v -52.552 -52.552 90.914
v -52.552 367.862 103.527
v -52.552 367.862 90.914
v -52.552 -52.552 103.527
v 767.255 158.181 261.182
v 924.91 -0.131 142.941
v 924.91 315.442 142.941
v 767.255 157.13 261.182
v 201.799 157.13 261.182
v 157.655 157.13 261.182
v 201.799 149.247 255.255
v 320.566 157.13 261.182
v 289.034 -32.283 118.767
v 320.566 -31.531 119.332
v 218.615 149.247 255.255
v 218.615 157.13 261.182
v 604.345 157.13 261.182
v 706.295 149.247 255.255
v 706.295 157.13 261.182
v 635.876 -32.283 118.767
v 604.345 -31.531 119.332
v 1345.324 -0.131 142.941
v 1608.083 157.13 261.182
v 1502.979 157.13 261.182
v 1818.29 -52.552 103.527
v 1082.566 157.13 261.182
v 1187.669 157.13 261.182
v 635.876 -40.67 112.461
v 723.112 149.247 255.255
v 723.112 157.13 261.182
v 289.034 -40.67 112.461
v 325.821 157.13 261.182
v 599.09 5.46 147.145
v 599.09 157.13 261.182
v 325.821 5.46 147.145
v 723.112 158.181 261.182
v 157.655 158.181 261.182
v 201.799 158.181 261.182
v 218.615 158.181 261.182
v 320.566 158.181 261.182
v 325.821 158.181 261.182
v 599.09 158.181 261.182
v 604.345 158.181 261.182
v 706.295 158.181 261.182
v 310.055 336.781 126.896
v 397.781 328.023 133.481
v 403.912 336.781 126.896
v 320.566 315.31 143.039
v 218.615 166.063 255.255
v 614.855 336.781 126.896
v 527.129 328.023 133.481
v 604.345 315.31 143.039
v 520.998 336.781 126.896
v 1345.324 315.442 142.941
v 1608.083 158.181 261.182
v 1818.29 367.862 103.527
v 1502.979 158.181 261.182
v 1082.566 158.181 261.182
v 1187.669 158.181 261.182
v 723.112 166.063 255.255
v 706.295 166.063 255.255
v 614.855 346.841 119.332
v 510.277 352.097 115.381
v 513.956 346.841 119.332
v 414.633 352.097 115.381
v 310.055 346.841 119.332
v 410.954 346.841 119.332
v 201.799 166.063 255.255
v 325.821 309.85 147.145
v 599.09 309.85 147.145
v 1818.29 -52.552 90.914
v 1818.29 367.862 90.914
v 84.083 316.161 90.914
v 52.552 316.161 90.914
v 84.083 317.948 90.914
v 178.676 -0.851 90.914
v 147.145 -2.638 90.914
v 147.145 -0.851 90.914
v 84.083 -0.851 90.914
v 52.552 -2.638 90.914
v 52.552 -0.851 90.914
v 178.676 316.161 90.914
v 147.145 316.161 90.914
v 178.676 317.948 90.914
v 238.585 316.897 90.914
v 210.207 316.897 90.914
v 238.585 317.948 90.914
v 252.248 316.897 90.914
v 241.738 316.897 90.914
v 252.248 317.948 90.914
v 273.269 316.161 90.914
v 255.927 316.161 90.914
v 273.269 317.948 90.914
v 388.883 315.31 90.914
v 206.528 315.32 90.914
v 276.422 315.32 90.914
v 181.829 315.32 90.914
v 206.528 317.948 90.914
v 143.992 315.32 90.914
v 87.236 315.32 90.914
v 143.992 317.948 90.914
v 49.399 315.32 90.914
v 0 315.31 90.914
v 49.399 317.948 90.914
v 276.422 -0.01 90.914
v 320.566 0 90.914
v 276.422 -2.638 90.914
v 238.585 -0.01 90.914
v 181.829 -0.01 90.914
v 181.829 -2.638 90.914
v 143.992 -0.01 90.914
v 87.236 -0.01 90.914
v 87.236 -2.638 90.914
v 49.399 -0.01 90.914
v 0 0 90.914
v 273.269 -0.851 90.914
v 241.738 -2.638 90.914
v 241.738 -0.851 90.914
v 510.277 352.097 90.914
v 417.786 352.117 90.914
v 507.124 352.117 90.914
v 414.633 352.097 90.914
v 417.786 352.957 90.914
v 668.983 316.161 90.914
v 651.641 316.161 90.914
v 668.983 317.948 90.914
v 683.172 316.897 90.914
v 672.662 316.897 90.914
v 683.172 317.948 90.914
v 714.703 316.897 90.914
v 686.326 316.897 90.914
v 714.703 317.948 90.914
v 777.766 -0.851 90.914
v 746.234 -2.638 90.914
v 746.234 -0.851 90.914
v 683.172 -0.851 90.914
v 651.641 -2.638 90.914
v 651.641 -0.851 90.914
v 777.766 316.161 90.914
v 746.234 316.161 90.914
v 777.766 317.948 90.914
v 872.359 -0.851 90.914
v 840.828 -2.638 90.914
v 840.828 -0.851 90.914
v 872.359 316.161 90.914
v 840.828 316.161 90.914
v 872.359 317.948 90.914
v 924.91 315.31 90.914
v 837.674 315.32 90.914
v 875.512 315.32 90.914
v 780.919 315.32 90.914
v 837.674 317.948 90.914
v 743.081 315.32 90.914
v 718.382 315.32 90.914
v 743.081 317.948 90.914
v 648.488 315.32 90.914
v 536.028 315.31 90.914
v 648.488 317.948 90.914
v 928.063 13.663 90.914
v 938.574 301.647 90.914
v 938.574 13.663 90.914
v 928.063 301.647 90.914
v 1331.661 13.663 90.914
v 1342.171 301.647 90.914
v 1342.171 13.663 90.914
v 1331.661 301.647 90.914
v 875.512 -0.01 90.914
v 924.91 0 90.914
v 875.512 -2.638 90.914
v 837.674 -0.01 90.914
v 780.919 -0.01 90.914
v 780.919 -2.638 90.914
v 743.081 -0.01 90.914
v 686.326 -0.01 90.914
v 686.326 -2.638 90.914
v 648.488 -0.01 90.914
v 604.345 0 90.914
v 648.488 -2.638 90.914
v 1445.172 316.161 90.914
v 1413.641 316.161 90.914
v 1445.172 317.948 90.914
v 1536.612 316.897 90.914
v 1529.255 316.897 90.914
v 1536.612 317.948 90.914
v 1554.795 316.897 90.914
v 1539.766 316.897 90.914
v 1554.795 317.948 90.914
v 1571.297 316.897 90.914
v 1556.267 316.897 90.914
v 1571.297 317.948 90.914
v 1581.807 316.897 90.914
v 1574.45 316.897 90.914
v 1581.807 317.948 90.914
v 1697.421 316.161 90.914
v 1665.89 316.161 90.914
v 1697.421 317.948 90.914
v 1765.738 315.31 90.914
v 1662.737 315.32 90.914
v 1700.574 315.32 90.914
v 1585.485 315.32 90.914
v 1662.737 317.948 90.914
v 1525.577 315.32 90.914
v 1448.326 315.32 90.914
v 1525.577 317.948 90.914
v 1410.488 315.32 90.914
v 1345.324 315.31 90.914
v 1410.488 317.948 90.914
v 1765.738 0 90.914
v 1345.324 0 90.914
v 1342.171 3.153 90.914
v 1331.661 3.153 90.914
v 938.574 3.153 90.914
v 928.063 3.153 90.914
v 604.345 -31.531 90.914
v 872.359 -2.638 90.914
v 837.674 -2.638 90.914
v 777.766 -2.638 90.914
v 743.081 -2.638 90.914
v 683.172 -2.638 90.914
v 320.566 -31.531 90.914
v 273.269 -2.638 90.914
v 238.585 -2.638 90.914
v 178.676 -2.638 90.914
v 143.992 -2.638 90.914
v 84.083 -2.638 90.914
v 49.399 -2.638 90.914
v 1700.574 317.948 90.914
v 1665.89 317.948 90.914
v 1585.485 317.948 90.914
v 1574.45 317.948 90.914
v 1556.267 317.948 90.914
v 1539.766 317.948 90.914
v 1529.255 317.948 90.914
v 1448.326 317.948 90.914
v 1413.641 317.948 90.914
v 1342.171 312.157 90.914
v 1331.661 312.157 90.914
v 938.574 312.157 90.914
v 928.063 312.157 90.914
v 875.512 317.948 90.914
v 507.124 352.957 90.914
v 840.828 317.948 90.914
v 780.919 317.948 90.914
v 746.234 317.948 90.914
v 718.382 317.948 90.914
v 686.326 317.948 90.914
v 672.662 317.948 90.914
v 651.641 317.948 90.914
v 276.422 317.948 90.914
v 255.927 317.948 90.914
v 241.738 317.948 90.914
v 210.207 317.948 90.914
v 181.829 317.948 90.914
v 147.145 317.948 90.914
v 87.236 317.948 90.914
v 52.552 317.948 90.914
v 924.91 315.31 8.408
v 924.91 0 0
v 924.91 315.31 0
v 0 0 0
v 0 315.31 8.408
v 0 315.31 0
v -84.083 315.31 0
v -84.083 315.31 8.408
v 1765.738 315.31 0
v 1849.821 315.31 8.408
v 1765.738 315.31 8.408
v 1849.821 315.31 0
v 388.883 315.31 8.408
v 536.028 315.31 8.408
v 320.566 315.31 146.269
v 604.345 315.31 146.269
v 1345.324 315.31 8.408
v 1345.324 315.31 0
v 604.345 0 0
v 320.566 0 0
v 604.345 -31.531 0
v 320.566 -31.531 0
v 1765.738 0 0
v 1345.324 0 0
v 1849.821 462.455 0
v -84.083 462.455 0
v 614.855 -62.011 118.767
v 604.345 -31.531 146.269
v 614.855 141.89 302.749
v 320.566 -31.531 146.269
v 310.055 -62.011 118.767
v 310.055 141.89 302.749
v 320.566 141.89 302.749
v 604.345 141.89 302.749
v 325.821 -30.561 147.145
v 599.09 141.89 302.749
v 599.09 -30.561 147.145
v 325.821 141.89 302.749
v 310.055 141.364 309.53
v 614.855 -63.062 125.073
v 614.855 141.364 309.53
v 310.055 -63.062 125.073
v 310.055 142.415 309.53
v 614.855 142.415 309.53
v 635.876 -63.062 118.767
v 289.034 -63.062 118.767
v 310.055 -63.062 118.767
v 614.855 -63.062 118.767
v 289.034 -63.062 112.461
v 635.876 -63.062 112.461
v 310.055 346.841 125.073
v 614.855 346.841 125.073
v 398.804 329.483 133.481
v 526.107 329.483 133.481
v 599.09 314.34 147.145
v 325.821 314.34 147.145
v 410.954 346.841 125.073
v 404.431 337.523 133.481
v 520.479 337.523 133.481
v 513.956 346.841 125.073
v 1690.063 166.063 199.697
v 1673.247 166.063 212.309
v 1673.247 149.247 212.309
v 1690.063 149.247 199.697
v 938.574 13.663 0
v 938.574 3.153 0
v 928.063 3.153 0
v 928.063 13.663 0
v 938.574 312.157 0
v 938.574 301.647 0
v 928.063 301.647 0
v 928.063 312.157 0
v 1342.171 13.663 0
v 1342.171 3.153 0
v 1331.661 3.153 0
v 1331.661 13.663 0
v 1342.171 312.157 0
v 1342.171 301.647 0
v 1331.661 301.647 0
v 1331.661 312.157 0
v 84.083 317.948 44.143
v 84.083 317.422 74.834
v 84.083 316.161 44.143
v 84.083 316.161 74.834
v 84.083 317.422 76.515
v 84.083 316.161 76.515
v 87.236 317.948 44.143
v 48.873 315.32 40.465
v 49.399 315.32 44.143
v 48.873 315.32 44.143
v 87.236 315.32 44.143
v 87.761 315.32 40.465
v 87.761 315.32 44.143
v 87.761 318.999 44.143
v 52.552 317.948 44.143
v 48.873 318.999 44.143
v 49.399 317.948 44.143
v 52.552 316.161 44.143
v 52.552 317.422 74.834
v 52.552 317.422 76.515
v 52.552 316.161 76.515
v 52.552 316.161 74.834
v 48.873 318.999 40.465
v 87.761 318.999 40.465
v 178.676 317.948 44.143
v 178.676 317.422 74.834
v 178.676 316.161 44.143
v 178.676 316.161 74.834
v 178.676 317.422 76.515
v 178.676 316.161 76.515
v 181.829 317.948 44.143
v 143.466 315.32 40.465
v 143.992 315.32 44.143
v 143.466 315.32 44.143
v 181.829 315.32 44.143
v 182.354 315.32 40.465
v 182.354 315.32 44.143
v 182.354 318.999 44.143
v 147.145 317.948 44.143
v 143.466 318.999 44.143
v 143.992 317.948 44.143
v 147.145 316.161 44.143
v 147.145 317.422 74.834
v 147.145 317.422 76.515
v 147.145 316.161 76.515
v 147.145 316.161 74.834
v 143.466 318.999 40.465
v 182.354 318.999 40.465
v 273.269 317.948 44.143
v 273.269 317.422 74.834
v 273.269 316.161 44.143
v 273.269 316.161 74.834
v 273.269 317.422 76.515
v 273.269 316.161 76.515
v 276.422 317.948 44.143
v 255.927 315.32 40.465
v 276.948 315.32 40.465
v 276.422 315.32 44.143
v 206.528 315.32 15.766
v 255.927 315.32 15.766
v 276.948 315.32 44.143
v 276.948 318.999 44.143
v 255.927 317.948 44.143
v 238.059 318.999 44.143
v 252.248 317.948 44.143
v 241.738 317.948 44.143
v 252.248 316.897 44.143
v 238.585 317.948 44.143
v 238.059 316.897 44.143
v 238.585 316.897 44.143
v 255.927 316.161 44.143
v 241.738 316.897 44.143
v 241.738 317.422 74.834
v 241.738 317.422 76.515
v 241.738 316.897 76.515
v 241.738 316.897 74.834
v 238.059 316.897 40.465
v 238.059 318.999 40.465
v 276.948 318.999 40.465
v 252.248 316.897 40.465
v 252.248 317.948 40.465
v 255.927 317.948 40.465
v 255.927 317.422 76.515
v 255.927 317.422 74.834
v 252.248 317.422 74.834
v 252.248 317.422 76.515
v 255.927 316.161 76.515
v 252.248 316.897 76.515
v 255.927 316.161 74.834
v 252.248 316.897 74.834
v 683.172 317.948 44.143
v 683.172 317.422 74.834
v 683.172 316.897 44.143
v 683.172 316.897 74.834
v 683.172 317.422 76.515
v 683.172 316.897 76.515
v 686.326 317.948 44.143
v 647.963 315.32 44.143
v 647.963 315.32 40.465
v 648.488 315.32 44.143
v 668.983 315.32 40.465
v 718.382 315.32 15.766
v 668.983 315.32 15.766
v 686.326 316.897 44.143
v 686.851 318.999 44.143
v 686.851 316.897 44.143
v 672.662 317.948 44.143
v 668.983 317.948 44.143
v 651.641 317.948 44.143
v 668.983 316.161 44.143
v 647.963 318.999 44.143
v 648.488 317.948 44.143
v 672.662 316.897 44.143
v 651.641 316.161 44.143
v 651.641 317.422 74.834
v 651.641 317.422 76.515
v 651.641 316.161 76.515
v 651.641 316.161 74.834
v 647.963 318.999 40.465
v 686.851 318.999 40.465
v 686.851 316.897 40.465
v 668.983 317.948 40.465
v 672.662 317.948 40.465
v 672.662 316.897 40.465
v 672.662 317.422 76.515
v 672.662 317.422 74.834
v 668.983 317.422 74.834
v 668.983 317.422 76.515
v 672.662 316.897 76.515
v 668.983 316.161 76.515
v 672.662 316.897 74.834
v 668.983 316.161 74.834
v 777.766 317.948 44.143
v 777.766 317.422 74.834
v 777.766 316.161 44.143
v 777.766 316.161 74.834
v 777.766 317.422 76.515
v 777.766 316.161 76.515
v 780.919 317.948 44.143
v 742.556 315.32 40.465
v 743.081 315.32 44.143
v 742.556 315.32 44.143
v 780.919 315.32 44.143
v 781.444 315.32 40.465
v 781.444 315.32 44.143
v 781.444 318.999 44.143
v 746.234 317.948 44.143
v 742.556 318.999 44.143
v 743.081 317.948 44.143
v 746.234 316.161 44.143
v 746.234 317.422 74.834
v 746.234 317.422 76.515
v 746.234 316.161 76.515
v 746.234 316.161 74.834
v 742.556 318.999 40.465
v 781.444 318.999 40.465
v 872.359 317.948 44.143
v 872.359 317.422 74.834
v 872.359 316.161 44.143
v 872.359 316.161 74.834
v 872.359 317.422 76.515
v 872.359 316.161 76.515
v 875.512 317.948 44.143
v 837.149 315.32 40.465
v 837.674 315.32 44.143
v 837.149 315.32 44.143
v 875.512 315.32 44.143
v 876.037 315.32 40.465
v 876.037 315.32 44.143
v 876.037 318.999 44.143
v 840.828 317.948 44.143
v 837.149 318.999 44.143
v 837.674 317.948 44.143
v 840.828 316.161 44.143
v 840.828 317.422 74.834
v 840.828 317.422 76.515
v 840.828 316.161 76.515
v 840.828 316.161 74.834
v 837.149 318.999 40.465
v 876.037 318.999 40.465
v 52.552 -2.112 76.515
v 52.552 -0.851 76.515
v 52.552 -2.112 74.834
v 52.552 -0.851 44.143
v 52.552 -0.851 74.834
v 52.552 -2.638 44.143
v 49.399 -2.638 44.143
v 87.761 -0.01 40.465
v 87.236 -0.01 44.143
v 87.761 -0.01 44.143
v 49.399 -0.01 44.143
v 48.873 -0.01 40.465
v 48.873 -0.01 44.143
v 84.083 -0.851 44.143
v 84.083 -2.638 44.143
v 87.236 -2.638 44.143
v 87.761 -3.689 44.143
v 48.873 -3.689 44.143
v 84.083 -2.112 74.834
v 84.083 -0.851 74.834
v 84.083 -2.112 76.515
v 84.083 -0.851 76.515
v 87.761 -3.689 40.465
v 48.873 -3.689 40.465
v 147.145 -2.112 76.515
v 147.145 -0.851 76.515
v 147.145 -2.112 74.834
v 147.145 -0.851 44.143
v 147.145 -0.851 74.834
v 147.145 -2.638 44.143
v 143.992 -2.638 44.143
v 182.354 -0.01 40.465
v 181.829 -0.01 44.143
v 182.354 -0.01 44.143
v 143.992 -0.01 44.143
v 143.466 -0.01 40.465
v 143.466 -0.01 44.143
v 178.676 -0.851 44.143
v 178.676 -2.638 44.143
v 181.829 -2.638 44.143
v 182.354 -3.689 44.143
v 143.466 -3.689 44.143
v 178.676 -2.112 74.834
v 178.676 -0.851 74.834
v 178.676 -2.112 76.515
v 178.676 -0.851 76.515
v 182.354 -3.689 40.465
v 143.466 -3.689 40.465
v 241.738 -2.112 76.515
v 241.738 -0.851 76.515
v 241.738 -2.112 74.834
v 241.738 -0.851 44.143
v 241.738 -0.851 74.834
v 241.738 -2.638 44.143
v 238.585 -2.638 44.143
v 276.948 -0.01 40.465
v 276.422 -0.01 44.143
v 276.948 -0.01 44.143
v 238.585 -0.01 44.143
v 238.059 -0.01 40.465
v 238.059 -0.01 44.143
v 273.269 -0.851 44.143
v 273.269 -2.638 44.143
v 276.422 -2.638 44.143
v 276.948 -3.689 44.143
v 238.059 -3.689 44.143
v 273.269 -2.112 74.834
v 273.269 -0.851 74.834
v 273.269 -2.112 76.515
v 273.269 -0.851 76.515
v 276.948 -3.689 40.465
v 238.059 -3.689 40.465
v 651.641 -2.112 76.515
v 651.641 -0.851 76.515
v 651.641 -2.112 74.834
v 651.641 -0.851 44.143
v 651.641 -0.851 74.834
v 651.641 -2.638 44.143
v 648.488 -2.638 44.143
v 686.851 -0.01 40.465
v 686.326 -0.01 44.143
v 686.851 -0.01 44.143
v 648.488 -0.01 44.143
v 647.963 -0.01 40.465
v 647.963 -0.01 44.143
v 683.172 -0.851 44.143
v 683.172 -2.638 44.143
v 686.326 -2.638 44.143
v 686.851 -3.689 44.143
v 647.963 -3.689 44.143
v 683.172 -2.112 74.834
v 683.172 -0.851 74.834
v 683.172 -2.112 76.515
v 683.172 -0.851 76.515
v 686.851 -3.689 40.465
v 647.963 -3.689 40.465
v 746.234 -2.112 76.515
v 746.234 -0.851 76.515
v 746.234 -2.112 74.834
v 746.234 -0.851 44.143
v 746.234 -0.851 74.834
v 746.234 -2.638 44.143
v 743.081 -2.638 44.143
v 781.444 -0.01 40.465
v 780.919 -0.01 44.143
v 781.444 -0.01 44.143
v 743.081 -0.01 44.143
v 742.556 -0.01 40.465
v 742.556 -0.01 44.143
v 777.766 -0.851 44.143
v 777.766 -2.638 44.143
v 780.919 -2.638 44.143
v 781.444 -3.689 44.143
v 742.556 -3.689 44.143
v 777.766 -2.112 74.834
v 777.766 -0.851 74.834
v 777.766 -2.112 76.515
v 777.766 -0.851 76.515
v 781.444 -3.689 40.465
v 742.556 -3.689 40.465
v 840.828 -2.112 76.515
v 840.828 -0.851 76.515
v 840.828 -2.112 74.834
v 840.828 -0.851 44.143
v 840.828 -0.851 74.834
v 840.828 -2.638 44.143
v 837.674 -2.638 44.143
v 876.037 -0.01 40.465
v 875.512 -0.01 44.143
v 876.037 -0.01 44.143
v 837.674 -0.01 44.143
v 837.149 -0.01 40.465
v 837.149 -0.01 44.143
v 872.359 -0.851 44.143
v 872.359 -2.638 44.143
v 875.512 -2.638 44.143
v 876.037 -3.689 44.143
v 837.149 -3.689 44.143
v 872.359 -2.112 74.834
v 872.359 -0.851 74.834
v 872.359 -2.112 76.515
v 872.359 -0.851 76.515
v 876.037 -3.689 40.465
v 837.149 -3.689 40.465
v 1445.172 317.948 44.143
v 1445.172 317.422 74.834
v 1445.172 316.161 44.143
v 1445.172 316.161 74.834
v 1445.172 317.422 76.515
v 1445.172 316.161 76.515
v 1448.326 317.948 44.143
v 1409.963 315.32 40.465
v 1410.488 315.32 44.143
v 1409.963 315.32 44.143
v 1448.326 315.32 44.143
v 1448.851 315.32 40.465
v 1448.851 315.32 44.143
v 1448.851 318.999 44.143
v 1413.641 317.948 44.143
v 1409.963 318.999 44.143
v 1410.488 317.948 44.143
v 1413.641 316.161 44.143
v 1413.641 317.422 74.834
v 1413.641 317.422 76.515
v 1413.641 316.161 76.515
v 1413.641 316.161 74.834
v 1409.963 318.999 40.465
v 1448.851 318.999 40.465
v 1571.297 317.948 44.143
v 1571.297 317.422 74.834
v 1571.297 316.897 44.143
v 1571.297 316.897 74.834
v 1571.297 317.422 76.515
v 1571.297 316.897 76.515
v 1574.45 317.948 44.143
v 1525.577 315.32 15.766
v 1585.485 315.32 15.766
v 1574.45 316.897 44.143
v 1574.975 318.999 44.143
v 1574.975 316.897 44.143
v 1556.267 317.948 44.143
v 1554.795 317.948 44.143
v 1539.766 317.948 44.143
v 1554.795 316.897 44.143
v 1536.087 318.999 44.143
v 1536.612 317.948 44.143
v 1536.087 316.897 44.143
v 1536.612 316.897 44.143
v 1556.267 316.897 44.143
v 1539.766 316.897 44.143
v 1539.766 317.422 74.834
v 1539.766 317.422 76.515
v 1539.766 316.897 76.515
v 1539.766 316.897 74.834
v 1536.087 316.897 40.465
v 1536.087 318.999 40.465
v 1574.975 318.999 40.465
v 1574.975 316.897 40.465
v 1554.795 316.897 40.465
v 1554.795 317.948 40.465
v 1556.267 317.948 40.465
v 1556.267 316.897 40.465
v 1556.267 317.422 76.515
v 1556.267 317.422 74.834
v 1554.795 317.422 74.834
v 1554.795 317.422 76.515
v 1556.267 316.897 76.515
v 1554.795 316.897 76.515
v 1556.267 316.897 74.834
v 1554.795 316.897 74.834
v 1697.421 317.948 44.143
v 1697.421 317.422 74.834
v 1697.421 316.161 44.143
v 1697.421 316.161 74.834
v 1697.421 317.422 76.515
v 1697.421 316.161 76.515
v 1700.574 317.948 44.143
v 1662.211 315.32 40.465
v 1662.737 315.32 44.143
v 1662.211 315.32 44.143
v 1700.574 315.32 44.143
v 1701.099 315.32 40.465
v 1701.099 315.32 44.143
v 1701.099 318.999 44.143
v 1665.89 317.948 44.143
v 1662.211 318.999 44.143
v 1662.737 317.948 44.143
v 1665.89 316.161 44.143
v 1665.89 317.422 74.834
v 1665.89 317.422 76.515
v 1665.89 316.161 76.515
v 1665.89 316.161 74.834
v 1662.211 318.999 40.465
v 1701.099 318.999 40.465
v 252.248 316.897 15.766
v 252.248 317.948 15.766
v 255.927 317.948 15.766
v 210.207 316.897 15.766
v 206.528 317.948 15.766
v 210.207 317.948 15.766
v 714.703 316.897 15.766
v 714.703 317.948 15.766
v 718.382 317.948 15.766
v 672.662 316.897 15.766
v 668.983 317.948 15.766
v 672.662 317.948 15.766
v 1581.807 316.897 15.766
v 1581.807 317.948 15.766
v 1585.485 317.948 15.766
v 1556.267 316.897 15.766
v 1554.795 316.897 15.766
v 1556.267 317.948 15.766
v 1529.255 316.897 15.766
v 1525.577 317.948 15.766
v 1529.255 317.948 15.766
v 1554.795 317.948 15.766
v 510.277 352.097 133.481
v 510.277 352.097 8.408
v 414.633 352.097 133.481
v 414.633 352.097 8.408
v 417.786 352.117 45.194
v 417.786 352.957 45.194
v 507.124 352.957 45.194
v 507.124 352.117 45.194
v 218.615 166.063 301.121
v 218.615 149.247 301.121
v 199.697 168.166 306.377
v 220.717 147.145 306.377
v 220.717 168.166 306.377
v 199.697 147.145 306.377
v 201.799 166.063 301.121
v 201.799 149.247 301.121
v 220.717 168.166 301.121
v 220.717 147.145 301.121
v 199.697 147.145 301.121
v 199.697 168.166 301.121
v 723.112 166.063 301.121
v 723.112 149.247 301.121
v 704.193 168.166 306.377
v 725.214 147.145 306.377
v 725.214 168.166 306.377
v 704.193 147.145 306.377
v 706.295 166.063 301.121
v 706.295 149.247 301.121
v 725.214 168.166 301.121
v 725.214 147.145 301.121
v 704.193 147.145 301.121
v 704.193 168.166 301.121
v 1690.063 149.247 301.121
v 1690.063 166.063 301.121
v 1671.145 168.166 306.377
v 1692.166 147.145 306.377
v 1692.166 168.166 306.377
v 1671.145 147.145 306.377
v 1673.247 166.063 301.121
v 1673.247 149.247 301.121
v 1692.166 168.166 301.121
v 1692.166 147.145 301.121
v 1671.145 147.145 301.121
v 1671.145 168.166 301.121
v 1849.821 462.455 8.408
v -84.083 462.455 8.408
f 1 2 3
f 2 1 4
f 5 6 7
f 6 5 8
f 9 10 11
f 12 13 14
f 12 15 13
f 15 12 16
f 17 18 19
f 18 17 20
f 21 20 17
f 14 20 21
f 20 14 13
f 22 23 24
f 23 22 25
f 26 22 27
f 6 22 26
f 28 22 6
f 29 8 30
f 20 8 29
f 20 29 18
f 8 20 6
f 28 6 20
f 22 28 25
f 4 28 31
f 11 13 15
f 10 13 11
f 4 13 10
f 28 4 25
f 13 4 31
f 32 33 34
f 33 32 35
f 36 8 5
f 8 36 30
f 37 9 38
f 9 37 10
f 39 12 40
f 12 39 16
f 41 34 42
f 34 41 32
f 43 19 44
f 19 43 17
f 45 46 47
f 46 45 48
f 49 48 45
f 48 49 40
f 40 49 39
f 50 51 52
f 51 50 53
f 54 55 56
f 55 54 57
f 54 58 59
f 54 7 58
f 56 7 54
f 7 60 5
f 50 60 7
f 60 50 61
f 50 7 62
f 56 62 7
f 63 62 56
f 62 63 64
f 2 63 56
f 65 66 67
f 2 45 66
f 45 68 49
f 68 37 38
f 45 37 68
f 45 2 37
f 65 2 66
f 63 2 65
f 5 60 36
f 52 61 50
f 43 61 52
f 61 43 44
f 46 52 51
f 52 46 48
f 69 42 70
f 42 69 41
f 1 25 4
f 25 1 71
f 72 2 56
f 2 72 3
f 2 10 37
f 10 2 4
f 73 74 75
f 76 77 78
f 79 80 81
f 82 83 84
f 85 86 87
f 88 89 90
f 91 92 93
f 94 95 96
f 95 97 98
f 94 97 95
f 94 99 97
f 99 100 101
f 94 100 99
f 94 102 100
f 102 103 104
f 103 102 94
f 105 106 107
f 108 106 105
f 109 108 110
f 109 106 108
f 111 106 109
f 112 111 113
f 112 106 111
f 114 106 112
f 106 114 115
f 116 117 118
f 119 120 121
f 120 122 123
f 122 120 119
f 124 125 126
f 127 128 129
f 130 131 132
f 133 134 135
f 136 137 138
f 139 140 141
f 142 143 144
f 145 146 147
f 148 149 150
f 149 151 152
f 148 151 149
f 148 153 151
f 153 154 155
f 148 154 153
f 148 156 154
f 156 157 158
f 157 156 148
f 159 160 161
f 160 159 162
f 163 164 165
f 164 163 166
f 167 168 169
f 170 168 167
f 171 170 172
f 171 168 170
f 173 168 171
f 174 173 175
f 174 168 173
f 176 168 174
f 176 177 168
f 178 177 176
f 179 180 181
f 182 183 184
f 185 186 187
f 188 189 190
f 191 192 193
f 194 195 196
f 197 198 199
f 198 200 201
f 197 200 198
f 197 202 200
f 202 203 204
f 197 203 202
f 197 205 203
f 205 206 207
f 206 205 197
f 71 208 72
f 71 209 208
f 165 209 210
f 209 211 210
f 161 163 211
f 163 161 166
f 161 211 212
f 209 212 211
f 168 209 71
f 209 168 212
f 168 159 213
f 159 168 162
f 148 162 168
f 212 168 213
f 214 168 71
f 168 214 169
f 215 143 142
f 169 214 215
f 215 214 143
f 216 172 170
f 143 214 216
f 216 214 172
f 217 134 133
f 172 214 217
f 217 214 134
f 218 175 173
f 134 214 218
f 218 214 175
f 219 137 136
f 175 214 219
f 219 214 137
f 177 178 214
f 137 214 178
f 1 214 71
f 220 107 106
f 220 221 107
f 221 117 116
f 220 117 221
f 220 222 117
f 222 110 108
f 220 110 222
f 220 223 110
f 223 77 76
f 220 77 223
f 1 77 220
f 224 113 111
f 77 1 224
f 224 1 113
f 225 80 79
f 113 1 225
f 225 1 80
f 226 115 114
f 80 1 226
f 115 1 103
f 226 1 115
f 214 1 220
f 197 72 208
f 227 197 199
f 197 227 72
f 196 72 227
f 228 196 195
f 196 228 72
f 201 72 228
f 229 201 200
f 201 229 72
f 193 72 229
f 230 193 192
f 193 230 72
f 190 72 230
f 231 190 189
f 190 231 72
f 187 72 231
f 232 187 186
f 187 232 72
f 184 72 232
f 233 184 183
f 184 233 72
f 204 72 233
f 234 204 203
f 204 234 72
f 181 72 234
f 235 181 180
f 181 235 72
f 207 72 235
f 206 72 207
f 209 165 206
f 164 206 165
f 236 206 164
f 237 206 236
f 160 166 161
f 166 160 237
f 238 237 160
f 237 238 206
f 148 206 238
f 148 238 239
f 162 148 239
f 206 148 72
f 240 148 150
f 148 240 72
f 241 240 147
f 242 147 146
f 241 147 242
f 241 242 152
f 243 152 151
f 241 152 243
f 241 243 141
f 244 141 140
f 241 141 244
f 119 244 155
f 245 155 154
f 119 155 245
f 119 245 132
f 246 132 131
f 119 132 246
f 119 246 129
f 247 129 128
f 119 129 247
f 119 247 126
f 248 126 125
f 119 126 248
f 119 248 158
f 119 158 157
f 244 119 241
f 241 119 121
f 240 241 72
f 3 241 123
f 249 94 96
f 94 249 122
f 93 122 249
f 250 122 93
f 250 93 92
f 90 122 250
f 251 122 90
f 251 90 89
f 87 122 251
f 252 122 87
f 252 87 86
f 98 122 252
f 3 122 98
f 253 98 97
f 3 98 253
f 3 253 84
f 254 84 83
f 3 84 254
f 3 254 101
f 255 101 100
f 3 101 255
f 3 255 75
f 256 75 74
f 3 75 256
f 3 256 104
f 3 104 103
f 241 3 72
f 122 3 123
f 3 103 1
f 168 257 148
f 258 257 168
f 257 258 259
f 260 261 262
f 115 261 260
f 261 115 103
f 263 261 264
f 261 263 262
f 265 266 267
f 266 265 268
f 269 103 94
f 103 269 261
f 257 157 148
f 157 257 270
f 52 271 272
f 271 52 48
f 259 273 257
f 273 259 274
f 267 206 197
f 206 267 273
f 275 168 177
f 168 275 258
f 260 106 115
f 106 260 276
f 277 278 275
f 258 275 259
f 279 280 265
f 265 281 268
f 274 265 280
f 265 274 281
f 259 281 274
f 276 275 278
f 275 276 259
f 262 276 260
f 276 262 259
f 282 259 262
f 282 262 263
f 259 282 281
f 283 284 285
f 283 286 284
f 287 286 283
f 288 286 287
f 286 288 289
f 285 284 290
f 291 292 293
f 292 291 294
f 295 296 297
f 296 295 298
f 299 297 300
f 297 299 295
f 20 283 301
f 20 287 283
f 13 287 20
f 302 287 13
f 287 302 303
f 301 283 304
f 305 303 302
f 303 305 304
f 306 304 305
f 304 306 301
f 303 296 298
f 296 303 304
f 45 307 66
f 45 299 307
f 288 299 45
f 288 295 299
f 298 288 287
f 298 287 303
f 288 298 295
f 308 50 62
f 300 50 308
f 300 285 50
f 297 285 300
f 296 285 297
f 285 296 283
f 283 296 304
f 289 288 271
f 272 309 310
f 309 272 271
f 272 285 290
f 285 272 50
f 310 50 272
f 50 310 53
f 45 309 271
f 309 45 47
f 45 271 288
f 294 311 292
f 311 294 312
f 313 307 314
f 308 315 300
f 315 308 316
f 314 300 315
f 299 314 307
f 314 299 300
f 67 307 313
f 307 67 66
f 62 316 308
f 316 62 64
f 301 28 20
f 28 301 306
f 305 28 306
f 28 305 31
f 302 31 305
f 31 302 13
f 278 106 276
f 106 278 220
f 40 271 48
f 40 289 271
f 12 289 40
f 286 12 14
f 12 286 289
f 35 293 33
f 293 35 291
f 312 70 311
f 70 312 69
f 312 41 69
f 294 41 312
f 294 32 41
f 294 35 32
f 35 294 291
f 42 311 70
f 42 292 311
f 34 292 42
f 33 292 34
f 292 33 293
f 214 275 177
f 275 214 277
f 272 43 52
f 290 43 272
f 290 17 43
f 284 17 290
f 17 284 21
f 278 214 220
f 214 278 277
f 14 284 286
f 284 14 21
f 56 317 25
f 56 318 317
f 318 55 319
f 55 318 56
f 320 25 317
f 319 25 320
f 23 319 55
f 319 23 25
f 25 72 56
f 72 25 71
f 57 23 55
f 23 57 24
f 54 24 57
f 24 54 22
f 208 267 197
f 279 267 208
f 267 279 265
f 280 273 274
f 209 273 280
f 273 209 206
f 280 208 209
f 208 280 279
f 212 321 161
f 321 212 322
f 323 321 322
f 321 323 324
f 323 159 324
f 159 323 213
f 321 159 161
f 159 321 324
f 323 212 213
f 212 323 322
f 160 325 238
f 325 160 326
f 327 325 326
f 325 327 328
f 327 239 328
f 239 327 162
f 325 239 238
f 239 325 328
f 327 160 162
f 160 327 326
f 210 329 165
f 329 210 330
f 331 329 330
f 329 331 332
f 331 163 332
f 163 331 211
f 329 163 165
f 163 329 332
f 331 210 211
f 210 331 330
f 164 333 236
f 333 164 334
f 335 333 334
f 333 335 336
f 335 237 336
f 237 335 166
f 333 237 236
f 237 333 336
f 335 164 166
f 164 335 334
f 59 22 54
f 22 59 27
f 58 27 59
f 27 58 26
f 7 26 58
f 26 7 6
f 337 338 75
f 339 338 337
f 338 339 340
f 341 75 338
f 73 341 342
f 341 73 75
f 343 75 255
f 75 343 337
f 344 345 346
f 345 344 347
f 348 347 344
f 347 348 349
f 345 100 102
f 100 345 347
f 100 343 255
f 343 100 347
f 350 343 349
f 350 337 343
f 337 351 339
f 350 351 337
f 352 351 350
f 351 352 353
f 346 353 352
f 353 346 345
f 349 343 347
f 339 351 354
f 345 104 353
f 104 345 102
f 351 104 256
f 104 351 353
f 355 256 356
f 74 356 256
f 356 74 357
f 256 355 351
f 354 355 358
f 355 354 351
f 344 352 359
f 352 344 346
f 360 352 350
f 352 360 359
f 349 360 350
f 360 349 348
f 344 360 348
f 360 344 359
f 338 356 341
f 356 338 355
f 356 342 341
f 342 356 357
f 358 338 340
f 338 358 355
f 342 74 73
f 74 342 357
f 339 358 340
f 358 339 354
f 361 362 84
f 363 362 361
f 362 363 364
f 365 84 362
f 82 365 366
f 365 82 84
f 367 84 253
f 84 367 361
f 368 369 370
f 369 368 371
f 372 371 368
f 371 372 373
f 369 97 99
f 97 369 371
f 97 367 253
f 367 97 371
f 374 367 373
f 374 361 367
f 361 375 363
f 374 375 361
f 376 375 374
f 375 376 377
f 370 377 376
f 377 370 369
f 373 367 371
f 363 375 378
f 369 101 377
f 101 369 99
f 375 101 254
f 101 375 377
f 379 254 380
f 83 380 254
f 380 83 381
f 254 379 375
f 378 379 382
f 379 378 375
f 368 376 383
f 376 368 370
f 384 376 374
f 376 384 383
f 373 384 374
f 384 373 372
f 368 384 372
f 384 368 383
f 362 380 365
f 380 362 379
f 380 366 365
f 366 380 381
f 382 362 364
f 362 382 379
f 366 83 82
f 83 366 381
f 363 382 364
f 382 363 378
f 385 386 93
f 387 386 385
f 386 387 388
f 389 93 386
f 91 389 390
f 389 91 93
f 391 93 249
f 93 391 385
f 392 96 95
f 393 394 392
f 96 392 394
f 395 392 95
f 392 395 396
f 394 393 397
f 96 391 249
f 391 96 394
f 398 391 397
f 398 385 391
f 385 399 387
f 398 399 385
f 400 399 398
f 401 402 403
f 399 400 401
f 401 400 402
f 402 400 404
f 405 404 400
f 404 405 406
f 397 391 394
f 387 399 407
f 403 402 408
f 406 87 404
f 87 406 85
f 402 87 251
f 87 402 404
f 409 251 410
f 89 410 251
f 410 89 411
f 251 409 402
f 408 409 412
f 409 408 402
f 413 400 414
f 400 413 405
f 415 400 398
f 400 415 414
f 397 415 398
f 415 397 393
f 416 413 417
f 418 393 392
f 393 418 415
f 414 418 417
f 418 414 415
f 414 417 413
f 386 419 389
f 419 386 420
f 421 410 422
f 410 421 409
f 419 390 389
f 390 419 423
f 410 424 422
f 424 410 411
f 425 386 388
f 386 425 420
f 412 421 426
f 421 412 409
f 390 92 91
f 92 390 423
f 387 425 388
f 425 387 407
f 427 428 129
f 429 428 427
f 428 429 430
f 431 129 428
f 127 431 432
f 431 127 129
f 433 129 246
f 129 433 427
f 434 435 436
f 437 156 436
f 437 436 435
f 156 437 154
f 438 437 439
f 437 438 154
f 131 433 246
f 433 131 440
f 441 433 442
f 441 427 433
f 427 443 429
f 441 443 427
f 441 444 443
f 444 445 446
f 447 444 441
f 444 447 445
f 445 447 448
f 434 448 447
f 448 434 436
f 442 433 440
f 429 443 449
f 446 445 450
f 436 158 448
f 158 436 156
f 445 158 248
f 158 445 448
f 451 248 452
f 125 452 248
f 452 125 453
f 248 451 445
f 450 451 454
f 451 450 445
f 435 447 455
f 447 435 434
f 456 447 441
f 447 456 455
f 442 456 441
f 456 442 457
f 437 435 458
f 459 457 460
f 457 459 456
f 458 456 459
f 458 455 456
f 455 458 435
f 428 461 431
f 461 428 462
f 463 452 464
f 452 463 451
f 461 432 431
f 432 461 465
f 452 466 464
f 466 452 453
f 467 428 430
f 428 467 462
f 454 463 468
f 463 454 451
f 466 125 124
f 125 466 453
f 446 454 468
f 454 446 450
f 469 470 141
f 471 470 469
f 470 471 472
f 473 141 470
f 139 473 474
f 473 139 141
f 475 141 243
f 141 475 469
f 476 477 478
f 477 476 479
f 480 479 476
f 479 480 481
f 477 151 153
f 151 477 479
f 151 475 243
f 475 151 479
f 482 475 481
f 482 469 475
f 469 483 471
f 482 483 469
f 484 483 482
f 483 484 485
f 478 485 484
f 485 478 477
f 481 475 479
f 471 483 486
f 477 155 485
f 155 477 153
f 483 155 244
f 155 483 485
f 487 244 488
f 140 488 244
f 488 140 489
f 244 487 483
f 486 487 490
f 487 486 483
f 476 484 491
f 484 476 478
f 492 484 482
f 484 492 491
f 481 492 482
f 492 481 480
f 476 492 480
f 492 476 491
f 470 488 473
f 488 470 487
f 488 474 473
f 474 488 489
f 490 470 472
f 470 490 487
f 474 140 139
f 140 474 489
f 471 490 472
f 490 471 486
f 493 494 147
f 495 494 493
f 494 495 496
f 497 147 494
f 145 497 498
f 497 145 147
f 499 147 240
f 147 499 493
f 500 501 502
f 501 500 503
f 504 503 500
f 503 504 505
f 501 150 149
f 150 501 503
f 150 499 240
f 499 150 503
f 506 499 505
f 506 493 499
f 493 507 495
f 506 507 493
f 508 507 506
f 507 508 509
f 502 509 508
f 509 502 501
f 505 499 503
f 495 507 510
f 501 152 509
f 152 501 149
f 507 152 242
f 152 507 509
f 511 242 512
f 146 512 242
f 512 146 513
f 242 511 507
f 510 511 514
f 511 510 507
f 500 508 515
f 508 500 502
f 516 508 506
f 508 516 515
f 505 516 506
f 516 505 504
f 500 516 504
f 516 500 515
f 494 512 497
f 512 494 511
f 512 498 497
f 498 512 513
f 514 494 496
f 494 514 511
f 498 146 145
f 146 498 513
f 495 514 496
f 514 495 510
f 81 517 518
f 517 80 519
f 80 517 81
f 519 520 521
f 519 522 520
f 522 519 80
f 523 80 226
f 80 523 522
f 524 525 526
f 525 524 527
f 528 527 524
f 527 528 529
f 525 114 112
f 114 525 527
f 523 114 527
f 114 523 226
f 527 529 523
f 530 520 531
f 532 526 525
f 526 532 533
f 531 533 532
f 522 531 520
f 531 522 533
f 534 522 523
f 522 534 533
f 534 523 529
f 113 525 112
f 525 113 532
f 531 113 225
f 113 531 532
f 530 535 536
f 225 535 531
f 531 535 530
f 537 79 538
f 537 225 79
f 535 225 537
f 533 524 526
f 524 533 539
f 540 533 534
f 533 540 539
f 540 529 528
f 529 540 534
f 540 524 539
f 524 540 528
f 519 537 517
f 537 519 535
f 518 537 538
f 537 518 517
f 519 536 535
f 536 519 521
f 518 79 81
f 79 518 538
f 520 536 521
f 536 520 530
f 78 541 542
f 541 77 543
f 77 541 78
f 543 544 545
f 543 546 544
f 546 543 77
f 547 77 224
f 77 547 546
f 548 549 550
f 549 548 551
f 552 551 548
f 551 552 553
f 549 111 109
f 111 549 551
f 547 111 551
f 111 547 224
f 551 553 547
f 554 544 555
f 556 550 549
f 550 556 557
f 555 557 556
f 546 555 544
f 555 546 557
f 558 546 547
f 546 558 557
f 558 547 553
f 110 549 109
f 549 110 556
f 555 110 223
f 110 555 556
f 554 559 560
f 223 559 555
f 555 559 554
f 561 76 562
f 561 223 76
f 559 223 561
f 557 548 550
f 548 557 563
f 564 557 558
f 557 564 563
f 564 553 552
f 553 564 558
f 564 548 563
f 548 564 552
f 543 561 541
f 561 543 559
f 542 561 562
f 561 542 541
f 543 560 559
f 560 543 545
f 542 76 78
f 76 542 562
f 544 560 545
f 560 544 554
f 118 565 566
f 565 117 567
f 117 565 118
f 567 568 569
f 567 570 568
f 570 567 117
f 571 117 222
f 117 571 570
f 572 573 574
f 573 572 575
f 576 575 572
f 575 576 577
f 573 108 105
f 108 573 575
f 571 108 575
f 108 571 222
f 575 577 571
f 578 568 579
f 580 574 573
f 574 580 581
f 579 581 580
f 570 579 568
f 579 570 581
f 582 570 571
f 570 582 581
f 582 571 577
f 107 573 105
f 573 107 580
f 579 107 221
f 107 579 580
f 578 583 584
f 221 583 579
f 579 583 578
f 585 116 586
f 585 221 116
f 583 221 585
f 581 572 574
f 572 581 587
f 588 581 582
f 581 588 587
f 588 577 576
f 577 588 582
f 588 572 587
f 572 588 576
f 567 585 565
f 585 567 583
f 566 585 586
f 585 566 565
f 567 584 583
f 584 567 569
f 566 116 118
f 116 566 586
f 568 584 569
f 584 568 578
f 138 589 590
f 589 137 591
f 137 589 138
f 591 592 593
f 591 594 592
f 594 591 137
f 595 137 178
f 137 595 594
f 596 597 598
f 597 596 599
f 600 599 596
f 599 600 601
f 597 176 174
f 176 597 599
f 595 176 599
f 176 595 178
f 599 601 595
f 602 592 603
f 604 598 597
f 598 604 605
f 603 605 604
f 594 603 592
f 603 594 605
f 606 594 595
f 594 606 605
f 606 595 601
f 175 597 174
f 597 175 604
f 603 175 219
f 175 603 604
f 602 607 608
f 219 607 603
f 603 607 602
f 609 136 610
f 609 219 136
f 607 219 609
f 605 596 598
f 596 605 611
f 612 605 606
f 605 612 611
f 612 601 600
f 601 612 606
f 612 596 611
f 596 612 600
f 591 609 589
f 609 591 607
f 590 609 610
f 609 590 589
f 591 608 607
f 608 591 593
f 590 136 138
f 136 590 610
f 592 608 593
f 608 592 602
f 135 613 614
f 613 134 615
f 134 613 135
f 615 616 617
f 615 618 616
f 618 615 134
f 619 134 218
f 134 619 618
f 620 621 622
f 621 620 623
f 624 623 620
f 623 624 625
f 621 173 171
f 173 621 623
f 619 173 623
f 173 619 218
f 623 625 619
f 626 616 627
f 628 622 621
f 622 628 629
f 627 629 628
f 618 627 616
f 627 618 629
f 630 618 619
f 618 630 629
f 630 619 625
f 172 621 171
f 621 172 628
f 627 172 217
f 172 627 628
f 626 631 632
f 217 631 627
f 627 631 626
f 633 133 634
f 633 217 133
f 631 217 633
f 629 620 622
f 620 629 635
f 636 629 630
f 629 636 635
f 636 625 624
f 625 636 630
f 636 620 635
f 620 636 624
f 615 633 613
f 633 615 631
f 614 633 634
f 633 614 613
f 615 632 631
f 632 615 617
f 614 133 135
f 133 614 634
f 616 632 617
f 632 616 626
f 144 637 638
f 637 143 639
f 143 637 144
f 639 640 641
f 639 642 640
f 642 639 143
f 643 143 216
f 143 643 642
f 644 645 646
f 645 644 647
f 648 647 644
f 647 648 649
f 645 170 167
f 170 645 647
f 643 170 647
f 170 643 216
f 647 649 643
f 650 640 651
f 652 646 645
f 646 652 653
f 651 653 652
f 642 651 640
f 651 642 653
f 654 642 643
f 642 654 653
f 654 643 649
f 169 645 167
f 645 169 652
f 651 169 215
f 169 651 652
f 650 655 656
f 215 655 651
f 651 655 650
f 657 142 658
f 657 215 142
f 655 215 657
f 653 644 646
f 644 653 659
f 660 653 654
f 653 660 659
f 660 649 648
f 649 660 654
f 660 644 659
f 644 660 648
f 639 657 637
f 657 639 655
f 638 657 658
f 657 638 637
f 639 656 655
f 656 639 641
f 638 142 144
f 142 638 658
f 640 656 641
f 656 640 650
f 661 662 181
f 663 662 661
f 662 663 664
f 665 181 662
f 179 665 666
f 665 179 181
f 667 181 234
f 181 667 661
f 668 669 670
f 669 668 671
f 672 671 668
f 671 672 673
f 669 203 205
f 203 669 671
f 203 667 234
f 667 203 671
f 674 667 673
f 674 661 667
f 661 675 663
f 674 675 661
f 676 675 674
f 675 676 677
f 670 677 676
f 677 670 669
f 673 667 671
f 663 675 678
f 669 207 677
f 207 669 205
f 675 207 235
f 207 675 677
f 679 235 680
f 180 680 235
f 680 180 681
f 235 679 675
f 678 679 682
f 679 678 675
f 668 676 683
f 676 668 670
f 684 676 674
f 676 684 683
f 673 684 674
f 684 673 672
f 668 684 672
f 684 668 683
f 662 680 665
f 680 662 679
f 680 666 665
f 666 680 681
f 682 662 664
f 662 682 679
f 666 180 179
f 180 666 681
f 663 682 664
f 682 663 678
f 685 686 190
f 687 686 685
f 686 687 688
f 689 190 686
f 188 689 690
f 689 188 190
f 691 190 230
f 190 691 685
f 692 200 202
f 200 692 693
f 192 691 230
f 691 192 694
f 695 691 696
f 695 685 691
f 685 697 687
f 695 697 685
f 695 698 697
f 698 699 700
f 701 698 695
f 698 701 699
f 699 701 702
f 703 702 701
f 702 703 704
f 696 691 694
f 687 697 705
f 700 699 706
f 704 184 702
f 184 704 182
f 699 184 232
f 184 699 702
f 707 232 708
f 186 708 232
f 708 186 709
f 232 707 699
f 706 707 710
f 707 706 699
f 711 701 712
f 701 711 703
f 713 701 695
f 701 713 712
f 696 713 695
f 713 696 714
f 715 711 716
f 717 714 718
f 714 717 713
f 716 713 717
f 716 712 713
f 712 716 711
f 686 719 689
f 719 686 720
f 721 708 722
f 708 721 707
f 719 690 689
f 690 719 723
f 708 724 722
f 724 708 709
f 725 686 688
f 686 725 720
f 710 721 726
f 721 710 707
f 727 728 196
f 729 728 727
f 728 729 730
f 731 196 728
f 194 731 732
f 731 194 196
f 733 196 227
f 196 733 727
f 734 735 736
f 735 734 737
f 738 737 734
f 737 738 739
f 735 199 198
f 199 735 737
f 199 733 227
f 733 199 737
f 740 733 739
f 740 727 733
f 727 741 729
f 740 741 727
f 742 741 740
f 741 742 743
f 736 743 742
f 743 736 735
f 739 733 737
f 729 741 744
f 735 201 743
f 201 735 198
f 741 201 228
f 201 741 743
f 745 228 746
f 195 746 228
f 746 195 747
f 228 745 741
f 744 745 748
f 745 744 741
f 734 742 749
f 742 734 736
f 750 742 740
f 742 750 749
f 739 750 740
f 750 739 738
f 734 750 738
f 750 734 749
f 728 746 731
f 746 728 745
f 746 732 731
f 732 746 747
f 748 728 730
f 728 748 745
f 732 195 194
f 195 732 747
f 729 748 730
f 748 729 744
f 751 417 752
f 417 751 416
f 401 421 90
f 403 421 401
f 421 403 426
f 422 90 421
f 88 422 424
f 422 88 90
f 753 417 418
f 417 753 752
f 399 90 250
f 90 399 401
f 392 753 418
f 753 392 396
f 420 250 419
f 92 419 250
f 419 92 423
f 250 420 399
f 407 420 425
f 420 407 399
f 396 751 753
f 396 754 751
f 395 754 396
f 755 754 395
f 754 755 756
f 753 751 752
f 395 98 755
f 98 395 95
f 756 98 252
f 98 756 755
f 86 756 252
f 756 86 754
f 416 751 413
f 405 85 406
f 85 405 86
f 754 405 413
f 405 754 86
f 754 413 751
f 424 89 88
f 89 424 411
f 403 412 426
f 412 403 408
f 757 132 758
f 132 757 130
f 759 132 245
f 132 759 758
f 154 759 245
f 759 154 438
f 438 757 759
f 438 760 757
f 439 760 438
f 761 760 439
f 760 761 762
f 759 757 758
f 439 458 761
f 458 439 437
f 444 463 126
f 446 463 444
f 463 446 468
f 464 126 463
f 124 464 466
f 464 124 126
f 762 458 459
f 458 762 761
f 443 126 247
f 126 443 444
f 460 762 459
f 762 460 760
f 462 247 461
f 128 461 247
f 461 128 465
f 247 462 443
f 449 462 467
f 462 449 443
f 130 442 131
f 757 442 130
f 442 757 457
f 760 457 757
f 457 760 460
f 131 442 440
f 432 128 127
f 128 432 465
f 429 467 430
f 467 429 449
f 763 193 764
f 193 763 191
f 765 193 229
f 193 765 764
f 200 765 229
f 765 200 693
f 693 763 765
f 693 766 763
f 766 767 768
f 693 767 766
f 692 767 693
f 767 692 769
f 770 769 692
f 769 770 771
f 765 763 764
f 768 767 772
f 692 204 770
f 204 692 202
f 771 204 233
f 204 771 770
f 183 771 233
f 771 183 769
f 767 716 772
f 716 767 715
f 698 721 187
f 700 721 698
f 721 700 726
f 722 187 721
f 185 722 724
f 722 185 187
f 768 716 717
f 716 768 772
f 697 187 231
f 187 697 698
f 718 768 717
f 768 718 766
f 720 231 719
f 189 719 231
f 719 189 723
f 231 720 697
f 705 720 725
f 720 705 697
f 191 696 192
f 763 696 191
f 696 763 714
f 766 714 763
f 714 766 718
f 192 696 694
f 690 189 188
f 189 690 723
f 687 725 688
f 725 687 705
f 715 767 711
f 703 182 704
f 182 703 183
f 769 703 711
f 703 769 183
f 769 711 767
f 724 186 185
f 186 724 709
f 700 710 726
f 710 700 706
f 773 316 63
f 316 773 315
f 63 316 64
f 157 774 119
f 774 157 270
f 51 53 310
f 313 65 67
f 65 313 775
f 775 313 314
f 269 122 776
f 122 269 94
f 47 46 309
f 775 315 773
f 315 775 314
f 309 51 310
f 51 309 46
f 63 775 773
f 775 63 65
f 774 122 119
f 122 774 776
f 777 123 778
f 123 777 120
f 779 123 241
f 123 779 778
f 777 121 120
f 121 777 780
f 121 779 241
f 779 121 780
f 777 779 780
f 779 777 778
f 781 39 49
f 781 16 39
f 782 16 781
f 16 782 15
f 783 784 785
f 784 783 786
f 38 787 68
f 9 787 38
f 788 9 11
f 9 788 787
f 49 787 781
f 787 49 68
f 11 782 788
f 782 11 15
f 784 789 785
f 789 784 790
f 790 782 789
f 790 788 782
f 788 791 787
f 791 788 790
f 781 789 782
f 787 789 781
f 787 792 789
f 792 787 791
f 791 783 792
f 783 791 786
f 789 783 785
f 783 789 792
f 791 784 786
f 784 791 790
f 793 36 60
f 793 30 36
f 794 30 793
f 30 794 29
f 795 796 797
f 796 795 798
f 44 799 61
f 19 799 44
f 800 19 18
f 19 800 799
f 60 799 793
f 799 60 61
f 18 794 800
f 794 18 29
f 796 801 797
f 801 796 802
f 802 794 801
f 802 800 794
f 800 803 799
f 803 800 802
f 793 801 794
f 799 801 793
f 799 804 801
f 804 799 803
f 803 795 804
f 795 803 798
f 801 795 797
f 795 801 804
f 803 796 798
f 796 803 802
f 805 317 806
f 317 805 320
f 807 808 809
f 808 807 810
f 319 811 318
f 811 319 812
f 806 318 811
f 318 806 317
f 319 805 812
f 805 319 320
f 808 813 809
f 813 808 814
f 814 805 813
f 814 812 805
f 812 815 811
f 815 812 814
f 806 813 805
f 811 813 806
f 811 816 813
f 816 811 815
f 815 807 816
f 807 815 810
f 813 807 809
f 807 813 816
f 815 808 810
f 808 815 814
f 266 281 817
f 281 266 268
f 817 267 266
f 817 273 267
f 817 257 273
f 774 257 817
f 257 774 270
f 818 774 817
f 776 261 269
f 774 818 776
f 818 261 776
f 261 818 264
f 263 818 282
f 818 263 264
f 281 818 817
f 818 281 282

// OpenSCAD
// =====================================================================
//  MILWAUKEE ROAD - WATERTOWN, WIS. PASSENGER DEPOT (FROST & GRANGER)
//  Source: Album sheet 48, drawing 6945, Sept 1896 (Frost & Granger).  Drawings are private reference (in copyright):
//  Research Library / RSW / Stations / Standard depots / Album of Depot Plans 1919.
//  Rib Side Works, 24 Nov 2026. FIRST SHAPE MODEL for review - not cut into print sections.
//  KNOWN (from the sheet): 168 ft overall: depot 88 x 30 ft (women's and men's waiting rooms 36 ft 6, office with bay), 40 ft pavilion, 40 x 30 baggage room; stone base, brick walls, hip roofs, centre gable dormer with lantern.
//  ESTIMATE: wall and ridge heights where not written, window count and spacing, colours.
//  Built with the shared depot builder ../../../_common/rsw_depot.scad (x along the track,
//  y = 0 town side, track side +y, feet).  SCALE: 29 = G, 48 = O, 87 = HO.
// =====================================================================
SCALE = 29;
include <../../../_common/rsw_depot.scad>

depot(blocks = [[0, 88, 0, 30, 13, 0.75, 0, 5, 2], [30.5, 27, -3, 33, 14, 0.9, 1, 3, 2], [128, 40, 0, 30, 13, 0.75, 0, 5, 2]],
      pavs   = [[88, 40, 0, 30, 13, 0.75, 0, 5, 2, 2]],
      wins   = [[6.5, 1, 3, 6, 4.2], [15.5, 1, 3, 6, 4.2], [24.5, 1, 3, 6, 4.2], [63.5, 1, 3, 6, 4.2], [72.5, 1, 3, 6, 4.2], [81.5, 1, 3, 6, 4.2], [6.5, 0, 3, 6, 4.2], [15.5, 0, 3, 6, 4.2], [24.5, 0, 3, 6, 4.2], [63.5, 0, 3, 6, 4.2], [72.5, 0, 3, 6, 4.2], [81.5, 0, 3, 6, 4.2], [136.0, 1, 3, 6, 4.2, 2], [148.0, 1, 3, 6, 4.2, 2], [160.0, 1, 3, 6, 4.2, 2]],
      doors  = [[22, 1, 4, 8, 0], [66, 1, 4, 8, 0], [148, 1, 5, 8, 1, 2]],
      bays   = [[44, 1, 14, 3.5]],
      chims  = [[20, 15, 29.15], [68, 15, 29.15], [160, 15, 29.15]],
      plat   = [-8, 184, 14, 0.8]);
